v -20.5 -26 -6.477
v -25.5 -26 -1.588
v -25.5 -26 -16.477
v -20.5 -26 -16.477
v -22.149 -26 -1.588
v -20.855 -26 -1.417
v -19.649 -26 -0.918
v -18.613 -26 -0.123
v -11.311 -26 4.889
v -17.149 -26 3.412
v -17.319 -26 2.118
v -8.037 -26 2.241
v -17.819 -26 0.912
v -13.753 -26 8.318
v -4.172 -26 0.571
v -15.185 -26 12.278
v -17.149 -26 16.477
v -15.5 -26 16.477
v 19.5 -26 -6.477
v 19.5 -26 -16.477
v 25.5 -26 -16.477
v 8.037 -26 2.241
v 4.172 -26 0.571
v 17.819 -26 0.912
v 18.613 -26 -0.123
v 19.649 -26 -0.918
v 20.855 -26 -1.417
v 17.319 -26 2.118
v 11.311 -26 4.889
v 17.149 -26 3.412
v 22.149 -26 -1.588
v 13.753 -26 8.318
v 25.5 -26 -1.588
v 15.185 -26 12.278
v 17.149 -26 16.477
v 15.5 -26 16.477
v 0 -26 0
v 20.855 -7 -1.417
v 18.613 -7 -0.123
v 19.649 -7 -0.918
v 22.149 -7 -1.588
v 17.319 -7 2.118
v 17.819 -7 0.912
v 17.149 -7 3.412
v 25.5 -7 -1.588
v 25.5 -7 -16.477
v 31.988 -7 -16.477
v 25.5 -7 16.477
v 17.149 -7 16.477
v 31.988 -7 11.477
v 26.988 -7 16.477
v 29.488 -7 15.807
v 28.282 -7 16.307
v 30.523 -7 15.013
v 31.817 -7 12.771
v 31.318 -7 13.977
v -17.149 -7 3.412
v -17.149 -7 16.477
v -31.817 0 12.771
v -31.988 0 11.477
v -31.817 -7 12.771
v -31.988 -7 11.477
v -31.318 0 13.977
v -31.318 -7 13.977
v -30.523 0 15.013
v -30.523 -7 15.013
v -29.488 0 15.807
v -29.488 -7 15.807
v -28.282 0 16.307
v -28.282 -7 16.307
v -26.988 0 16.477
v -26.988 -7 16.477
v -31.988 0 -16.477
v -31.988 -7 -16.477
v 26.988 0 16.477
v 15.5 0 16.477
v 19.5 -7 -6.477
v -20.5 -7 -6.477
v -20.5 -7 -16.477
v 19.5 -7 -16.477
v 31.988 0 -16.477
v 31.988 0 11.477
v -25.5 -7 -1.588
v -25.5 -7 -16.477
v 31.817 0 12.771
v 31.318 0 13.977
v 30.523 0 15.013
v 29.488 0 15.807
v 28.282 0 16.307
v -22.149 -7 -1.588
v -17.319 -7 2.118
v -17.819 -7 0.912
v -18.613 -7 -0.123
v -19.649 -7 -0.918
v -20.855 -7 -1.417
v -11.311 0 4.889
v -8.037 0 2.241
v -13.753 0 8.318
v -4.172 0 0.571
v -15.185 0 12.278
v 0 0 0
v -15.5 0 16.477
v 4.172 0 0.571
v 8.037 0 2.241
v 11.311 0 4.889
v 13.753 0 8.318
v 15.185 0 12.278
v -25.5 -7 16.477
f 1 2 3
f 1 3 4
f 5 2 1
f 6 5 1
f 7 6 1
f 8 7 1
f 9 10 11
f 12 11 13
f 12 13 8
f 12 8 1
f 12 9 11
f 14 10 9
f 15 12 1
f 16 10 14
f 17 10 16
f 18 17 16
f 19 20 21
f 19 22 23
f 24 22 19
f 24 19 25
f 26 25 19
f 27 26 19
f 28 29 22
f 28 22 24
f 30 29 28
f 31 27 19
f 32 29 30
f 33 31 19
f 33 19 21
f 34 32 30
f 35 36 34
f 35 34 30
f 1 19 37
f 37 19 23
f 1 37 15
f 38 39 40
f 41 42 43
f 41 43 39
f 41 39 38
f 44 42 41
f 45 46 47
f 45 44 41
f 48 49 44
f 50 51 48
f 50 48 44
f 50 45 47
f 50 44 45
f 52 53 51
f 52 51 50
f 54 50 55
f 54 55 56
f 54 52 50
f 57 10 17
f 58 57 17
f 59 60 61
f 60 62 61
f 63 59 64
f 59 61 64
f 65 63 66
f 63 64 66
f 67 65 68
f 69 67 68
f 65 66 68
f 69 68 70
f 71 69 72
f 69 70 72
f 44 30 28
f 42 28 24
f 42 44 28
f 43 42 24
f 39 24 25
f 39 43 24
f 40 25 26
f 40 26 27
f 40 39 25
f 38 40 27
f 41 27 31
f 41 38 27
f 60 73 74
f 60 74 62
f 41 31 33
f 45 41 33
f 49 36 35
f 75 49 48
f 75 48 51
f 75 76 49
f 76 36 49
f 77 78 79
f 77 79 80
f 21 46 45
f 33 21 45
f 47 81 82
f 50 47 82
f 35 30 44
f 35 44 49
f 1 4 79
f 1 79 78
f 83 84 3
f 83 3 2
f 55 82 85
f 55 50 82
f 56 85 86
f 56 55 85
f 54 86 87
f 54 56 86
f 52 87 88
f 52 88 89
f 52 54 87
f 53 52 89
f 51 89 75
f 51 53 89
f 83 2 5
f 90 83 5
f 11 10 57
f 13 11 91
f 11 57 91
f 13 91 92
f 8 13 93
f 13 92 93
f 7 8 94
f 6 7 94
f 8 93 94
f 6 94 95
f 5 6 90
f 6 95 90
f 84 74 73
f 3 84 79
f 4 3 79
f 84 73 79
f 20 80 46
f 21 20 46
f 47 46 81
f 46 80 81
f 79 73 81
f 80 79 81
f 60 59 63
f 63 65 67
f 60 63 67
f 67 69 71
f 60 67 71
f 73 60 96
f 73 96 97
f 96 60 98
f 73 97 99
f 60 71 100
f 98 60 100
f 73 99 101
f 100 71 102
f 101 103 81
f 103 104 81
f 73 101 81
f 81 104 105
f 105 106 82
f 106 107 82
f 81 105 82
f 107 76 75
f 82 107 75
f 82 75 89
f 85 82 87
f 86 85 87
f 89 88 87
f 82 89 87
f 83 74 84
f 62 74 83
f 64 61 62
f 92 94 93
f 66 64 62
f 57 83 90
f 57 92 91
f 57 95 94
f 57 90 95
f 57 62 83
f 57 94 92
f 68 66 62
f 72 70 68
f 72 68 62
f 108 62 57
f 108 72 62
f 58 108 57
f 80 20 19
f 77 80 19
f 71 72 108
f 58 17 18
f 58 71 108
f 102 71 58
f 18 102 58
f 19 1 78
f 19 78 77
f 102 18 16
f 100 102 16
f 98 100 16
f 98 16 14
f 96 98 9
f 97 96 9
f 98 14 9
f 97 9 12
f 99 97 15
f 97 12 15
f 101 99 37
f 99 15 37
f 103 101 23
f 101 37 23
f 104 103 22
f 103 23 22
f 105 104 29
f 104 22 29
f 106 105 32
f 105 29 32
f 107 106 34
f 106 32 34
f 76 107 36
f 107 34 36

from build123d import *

# Parameters (mm, degrees)
F0_W      = 63.9754086733
F0_H      = 32.954
F1_DEPTH  = 7
F2_W      = 51
F2_H      = 32.954
F3_DEPTH  = 19
F4_W      = 40
F4_H      = 10
F5_DEPTH  = 19
F7_DEPTH  = 47.2
F8_R      = 5
F9_W      = 8.3512892127
F9_H      = 18.0645763493
F10_DEPTH = 19
F11_R     = 5


with BuildPart() as f1:
    # F0 (on Front) → F1 (new body)
    with BuildSketch(Plane.XZ):
        Rectangle(F0_W, F0_H)
    extrude(amount=F1_DEPTH)

    # F2 (on face) → F3 (join)
    with BuildSketch(Plane.XZ.offset(7)):
        Rectangle(F2_W, F2_H)
    extrude(amount=F3_DEPTH)

    # F4 (on face) → F5 (cut)
    with BuildSketch(Plane.XZ.offset(26)):
        with Locations((-0.5, -11.477)):
            Rectangle(F4_W, F4_H)
    extrude(amount=-F5_DEPTH, mode=Mode.SUBTRACT)

    # F6 (on face) → F7 (cut)
    with BuildSketch(Plane.XZ.offset(26)):
        with BuildLine():
            Line((15.5, 16.477), (-15.5, 16.477))
            ThreePointArc((-15.5, 16.477), (0, 0), (15.5, 16.477))
        make_face()
    extrude(amount=-F7_DEPTH, mode=Mode.SUBTRACT)

    # F8
    f8_edges = [f1.edges().sort_by_distance(p)[0] for p in [
        (31.987704, -3.5, 16.477),
        (-31.987704, -3.5, 16.477),
    ]]
    fillet(f8_edges, radius=F8_R)

    # F9 (on face) → F10 (cut)
    with BuildSketch(Plane.XZ.offset(26)):
        with Locations((-21.3243553936, 7.4447118254)):
            Rectangle(F9_W, F9_H)
        with Locations((21.3243553936, 7.4447118254)):
            Rectangle(F9_W, F9_H)
    extrude(amount=-F10_DEPTH, mode=Mode.SUBTRACT)

    # F11
    f11_edges = [f1.edges().sort_by_distance(p)[0] for p in [
        (-17.148711, -16.5, -1.587576),
        (17.148711, -16.5, -1.587576),
    ]]
    fillet(f11_edges, radius=F11_R)


solid = f1.part
